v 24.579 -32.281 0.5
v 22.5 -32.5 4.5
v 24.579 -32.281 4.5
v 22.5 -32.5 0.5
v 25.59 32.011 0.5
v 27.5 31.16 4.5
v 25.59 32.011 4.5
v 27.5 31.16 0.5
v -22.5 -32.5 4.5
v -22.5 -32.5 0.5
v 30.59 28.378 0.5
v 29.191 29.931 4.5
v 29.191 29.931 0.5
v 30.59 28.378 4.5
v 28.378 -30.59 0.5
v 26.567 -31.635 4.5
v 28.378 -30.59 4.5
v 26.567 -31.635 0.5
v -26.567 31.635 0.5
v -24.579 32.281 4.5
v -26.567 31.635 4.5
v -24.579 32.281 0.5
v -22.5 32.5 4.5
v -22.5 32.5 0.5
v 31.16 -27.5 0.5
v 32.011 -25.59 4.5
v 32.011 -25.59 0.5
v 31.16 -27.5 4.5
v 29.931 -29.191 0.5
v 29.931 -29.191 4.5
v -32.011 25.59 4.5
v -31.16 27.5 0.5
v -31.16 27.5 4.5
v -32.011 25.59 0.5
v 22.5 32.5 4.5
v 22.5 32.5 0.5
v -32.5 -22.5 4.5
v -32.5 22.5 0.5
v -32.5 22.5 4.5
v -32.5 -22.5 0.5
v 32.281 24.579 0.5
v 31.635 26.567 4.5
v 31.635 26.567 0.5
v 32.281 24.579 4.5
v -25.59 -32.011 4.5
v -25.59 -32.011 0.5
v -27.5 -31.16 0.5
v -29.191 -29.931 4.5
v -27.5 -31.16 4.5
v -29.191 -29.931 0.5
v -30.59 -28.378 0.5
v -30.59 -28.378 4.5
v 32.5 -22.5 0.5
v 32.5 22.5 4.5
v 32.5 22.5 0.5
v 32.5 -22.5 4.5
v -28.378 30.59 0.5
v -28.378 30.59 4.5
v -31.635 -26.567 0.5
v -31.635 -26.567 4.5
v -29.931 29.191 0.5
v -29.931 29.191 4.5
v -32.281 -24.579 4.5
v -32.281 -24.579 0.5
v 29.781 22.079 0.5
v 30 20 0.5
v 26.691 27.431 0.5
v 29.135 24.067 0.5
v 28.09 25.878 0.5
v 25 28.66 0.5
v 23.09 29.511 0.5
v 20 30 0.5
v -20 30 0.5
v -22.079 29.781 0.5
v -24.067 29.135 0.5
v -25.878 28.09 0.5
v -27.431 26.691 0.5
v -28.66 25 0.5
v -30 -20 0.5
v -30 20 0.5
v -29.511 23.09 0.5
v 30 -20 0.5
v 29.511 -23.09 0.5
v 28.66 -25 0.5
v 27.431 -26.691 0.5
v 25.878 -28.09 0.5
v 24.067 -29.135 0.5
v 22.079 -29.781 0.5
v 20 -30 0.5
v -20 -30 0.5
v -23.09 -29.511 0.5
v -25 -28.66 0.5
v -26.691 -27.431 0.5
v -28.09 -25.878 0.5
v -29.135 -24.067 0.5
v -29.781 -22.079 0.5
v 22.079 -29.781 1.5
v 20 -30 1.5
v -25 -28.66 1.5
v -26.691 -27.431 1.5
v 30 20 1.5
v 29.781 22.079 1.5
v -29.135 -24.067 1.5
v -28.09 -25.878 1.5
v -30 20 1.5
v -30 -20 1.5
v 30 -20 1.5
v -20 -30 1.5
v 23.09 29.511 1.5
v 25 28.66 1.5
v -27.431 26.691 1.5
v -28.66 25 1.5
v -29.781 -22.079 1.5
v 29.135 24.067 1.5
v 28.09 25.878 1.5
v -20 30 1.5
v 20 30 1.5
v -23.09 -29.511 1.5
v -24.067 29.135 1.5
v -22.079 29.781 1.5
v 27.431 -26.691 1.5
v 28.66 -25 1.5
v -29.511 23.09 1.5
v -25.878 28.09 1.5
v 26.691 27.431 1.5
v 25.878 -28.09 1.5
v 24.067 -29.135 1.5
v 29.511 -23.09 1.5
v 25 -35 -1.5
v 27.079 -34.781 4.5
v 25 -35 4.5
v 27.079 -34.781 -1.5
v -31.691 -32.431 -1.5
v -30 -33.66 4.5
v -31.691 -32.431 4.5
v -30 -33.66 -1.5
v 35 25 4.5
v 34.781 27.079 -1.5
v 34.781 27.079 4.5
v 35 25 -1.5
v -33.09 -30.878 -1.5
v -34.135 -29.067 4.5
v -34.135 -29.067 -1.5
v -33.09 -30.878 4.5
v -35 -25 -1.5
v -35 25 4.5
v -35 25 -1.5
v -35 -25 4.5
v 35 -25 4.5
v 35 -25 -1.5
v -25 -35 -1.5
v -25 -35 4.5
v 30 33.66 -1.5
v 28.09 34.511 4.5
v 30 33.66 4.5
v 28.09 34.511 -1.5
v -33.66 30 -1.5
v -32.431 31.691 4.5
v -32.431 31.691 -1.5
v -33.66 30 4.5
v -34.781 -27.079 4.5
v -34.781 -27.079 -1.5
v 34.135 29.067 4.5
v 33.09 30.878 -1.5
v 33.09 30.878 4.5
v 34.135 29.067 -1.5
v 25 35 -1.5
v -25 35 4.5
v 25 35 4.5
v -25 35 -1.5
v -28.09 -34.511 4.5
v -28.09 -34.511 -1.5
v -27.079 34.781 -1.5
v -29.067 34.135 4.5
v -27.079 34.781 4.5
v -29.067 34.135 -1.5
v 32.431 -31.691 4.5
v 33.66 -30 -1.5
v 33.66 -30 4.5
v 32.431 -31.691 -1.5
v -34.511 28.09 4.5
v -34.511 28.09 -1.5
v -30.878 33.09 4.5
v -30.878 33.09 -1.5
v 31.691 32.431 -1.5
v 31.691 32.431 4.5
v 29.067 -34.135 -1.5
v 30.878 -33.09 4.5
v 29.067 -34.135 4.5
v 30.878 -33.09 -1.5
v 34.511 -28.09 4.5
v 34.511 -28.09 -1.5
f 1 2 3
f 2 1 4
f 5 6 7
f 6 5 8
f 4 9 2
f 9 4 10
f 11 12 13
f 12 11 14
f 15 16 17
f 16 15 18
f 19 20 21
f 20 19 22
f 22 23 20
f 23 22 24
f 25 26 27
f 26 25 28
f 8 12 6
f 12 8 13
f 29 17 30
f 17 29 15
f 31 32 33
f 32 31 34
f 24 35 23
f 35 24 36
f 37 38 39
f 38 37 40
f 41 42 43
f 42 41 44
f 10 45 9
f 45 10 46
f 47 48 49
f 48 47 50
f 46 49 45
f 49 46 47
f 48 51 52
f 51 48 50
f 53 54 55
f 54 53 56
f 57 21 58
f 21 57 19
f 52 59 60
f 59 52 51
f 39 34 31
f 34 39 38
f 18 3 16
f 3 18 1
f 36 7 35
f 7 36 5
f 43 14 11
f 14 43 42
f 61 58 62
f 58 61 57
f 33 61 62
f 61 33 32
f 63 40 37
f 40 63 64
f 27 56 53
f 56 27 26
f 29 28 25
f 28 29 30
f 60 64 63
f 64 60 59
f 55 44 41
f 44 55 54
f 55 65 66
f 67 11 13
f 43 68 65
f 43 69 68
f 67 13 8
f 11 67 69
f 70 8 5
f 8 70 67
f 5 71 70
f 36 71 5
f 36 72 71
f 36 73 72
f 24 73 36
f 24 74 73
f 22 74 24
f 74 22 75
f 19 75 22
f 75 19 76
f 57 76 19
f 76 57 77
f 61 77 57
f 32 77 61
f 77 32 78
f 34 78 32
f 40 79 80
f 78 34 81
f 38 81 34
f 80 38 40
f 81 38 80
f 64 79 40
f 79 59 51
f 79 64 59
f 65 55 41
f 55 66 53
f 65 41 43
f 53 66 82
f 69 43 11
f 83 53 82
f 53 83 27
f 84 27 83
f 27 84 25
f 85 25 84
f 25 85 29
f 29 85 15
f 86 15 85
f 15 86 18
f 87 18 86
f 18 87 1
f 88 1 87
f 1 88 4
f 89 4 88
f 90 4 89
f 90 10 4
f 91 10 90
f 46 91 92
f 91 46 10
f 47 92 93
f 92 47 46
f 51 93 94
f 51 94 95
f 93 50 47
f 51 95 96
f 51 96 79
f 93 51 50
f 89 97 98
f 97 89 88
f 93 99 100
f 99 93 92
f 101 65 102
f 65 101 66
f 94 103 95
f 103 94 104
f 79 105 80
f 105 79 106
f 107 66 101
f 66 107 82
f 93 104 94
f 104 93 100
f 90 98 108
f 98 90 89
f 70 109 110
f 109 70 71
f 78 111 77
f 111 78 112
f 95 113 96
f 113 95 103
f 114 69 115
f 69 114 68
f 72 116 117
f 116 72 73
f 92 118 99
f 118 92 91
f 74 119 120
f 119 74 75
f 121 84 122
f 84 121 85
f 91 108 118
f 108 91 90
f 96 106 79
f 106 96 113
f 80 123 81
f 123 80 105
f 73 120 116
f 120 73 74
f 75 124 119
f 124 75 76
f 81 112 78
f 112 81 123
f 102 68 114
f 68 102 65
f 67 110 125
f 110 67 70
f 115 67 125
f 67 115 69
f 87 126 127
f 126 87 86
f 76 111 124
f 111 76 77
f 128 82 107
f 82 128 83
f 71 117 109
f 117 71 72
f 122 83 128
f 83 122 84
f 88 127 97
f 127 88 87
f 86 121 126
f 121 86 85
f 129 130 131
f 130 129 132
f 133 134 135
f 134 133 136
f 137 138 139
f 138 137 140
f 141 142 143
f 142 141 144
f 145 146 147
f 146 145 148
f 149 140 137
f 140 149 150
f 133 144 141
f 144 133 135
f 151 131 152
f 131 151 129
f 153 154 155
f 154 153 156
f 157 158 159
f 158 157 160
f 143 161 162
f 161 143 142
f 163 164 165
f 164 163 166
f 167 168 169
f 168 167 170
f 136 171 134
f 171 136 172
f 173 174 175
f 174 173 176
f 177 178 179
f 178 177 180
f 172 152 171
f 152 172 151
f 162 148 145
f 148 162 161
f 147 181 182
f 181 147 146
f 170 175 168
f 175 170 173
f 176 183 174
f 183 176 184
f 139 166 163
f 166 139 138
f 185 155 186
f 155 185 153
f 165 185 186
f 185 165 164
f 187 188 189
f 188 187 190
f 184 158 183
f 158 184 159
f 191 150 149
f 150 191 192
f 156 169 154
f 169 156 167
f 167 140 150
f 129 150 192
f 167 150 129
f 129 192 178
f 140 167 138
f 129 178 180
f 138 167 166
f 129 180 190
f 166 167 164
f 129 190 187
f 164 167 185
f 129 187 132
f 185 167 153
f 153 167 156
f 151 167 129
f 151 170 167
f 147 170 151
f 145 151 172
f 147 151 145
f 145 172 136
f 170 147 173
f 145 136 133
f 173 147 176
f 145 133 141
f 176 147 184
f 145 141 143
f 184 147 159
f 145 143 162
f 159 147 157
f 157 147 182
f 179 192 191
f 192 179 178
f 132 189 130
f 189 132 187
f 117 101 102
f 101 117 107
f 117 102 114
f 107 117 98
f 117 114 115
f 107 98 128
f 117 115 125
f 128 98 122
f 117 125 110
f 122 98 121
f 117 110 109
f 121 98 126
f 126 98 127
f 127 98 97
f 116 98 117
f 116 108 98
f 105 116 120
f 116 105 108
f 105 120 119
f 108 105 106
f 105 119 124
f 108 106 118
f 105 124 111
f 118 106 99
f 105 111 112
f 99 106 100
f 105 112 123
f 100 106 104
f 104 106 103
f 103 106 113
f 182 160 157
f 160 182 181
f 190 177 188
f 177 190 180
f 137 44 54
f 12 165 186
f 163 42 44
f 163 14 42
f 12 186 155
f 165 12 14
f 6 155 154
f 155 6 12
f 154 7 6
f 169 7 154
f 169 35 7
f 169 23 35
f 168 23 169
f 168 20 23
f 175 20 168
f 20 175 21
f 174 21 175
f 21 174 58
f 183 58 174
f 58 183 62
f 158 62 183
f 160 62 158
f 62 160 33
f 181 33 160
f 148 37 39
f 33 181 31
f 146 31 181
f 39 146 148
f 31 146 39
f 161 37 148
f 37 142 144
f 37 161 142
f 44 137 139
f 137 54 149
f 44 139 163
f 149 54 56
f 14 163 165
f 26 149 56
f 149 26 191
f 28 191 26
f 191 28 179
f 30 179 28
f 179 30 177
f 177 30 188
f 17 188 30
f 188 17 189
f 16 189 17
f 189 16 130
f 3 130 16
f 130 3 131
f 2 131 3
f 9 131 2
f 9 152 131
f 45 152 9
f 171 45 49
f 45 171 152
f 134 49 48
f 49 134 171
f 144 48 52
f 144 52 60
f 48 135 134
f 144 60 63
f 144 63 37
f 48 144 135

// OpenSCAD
/*
 * Test for a stamp mold
 */
echo(version=version());

logo = "images/sky.03.small.png"; 
imgRatio = 1.15;
logox = 500 * imgRatio; 
logoy = 495 * imgRatio; 

module roundedRect(size, radius) {  
	linear_extrude(height=size.z, center=true) {
		offset(radius) offset(-radius) {
			square([size.x, size.y], center = true);
		}
	}
}

// Base plate
// ----------
plateWidth = 70;
plateLength = 70;
plateThickNess = 3;
cornerRadius = 10;

difference() {  
	union() {
		difference() {
			roundedRect([plateWidth, plateLength, plateThickNess], cornerRadius);
			translate([0, 0, 2]) {
				scale([.9 * plateWidth / logox, .9 * plateWidth / logoy, .02]) {
					color("white") {
						rotate([0, 0, -90]) {
							surface(file=logo, invert=true, center=true);
						}
					}
				}
        // the groove around the picture
        difference() {
          roundedRect([plateWidth -  5, plateLength -  5, plateThickNess], cornerRadius);
          roundedRect([plateWidth - 10, plateLength - 10, plateThickNess * 1.1], cornerRadius);
        }
			}
		}
		// The frame
		translate([0, 0, (plateThickNess / 1)]) {
			difference() {
				roundedRect([plateWidth, plateLength, plateThickNess], cornerRadius);
				roundedRect([plateWidth - 5, plateLength - 5, plateThickNess * 1.1], cornerRadius);
			}
		}
	}
}
